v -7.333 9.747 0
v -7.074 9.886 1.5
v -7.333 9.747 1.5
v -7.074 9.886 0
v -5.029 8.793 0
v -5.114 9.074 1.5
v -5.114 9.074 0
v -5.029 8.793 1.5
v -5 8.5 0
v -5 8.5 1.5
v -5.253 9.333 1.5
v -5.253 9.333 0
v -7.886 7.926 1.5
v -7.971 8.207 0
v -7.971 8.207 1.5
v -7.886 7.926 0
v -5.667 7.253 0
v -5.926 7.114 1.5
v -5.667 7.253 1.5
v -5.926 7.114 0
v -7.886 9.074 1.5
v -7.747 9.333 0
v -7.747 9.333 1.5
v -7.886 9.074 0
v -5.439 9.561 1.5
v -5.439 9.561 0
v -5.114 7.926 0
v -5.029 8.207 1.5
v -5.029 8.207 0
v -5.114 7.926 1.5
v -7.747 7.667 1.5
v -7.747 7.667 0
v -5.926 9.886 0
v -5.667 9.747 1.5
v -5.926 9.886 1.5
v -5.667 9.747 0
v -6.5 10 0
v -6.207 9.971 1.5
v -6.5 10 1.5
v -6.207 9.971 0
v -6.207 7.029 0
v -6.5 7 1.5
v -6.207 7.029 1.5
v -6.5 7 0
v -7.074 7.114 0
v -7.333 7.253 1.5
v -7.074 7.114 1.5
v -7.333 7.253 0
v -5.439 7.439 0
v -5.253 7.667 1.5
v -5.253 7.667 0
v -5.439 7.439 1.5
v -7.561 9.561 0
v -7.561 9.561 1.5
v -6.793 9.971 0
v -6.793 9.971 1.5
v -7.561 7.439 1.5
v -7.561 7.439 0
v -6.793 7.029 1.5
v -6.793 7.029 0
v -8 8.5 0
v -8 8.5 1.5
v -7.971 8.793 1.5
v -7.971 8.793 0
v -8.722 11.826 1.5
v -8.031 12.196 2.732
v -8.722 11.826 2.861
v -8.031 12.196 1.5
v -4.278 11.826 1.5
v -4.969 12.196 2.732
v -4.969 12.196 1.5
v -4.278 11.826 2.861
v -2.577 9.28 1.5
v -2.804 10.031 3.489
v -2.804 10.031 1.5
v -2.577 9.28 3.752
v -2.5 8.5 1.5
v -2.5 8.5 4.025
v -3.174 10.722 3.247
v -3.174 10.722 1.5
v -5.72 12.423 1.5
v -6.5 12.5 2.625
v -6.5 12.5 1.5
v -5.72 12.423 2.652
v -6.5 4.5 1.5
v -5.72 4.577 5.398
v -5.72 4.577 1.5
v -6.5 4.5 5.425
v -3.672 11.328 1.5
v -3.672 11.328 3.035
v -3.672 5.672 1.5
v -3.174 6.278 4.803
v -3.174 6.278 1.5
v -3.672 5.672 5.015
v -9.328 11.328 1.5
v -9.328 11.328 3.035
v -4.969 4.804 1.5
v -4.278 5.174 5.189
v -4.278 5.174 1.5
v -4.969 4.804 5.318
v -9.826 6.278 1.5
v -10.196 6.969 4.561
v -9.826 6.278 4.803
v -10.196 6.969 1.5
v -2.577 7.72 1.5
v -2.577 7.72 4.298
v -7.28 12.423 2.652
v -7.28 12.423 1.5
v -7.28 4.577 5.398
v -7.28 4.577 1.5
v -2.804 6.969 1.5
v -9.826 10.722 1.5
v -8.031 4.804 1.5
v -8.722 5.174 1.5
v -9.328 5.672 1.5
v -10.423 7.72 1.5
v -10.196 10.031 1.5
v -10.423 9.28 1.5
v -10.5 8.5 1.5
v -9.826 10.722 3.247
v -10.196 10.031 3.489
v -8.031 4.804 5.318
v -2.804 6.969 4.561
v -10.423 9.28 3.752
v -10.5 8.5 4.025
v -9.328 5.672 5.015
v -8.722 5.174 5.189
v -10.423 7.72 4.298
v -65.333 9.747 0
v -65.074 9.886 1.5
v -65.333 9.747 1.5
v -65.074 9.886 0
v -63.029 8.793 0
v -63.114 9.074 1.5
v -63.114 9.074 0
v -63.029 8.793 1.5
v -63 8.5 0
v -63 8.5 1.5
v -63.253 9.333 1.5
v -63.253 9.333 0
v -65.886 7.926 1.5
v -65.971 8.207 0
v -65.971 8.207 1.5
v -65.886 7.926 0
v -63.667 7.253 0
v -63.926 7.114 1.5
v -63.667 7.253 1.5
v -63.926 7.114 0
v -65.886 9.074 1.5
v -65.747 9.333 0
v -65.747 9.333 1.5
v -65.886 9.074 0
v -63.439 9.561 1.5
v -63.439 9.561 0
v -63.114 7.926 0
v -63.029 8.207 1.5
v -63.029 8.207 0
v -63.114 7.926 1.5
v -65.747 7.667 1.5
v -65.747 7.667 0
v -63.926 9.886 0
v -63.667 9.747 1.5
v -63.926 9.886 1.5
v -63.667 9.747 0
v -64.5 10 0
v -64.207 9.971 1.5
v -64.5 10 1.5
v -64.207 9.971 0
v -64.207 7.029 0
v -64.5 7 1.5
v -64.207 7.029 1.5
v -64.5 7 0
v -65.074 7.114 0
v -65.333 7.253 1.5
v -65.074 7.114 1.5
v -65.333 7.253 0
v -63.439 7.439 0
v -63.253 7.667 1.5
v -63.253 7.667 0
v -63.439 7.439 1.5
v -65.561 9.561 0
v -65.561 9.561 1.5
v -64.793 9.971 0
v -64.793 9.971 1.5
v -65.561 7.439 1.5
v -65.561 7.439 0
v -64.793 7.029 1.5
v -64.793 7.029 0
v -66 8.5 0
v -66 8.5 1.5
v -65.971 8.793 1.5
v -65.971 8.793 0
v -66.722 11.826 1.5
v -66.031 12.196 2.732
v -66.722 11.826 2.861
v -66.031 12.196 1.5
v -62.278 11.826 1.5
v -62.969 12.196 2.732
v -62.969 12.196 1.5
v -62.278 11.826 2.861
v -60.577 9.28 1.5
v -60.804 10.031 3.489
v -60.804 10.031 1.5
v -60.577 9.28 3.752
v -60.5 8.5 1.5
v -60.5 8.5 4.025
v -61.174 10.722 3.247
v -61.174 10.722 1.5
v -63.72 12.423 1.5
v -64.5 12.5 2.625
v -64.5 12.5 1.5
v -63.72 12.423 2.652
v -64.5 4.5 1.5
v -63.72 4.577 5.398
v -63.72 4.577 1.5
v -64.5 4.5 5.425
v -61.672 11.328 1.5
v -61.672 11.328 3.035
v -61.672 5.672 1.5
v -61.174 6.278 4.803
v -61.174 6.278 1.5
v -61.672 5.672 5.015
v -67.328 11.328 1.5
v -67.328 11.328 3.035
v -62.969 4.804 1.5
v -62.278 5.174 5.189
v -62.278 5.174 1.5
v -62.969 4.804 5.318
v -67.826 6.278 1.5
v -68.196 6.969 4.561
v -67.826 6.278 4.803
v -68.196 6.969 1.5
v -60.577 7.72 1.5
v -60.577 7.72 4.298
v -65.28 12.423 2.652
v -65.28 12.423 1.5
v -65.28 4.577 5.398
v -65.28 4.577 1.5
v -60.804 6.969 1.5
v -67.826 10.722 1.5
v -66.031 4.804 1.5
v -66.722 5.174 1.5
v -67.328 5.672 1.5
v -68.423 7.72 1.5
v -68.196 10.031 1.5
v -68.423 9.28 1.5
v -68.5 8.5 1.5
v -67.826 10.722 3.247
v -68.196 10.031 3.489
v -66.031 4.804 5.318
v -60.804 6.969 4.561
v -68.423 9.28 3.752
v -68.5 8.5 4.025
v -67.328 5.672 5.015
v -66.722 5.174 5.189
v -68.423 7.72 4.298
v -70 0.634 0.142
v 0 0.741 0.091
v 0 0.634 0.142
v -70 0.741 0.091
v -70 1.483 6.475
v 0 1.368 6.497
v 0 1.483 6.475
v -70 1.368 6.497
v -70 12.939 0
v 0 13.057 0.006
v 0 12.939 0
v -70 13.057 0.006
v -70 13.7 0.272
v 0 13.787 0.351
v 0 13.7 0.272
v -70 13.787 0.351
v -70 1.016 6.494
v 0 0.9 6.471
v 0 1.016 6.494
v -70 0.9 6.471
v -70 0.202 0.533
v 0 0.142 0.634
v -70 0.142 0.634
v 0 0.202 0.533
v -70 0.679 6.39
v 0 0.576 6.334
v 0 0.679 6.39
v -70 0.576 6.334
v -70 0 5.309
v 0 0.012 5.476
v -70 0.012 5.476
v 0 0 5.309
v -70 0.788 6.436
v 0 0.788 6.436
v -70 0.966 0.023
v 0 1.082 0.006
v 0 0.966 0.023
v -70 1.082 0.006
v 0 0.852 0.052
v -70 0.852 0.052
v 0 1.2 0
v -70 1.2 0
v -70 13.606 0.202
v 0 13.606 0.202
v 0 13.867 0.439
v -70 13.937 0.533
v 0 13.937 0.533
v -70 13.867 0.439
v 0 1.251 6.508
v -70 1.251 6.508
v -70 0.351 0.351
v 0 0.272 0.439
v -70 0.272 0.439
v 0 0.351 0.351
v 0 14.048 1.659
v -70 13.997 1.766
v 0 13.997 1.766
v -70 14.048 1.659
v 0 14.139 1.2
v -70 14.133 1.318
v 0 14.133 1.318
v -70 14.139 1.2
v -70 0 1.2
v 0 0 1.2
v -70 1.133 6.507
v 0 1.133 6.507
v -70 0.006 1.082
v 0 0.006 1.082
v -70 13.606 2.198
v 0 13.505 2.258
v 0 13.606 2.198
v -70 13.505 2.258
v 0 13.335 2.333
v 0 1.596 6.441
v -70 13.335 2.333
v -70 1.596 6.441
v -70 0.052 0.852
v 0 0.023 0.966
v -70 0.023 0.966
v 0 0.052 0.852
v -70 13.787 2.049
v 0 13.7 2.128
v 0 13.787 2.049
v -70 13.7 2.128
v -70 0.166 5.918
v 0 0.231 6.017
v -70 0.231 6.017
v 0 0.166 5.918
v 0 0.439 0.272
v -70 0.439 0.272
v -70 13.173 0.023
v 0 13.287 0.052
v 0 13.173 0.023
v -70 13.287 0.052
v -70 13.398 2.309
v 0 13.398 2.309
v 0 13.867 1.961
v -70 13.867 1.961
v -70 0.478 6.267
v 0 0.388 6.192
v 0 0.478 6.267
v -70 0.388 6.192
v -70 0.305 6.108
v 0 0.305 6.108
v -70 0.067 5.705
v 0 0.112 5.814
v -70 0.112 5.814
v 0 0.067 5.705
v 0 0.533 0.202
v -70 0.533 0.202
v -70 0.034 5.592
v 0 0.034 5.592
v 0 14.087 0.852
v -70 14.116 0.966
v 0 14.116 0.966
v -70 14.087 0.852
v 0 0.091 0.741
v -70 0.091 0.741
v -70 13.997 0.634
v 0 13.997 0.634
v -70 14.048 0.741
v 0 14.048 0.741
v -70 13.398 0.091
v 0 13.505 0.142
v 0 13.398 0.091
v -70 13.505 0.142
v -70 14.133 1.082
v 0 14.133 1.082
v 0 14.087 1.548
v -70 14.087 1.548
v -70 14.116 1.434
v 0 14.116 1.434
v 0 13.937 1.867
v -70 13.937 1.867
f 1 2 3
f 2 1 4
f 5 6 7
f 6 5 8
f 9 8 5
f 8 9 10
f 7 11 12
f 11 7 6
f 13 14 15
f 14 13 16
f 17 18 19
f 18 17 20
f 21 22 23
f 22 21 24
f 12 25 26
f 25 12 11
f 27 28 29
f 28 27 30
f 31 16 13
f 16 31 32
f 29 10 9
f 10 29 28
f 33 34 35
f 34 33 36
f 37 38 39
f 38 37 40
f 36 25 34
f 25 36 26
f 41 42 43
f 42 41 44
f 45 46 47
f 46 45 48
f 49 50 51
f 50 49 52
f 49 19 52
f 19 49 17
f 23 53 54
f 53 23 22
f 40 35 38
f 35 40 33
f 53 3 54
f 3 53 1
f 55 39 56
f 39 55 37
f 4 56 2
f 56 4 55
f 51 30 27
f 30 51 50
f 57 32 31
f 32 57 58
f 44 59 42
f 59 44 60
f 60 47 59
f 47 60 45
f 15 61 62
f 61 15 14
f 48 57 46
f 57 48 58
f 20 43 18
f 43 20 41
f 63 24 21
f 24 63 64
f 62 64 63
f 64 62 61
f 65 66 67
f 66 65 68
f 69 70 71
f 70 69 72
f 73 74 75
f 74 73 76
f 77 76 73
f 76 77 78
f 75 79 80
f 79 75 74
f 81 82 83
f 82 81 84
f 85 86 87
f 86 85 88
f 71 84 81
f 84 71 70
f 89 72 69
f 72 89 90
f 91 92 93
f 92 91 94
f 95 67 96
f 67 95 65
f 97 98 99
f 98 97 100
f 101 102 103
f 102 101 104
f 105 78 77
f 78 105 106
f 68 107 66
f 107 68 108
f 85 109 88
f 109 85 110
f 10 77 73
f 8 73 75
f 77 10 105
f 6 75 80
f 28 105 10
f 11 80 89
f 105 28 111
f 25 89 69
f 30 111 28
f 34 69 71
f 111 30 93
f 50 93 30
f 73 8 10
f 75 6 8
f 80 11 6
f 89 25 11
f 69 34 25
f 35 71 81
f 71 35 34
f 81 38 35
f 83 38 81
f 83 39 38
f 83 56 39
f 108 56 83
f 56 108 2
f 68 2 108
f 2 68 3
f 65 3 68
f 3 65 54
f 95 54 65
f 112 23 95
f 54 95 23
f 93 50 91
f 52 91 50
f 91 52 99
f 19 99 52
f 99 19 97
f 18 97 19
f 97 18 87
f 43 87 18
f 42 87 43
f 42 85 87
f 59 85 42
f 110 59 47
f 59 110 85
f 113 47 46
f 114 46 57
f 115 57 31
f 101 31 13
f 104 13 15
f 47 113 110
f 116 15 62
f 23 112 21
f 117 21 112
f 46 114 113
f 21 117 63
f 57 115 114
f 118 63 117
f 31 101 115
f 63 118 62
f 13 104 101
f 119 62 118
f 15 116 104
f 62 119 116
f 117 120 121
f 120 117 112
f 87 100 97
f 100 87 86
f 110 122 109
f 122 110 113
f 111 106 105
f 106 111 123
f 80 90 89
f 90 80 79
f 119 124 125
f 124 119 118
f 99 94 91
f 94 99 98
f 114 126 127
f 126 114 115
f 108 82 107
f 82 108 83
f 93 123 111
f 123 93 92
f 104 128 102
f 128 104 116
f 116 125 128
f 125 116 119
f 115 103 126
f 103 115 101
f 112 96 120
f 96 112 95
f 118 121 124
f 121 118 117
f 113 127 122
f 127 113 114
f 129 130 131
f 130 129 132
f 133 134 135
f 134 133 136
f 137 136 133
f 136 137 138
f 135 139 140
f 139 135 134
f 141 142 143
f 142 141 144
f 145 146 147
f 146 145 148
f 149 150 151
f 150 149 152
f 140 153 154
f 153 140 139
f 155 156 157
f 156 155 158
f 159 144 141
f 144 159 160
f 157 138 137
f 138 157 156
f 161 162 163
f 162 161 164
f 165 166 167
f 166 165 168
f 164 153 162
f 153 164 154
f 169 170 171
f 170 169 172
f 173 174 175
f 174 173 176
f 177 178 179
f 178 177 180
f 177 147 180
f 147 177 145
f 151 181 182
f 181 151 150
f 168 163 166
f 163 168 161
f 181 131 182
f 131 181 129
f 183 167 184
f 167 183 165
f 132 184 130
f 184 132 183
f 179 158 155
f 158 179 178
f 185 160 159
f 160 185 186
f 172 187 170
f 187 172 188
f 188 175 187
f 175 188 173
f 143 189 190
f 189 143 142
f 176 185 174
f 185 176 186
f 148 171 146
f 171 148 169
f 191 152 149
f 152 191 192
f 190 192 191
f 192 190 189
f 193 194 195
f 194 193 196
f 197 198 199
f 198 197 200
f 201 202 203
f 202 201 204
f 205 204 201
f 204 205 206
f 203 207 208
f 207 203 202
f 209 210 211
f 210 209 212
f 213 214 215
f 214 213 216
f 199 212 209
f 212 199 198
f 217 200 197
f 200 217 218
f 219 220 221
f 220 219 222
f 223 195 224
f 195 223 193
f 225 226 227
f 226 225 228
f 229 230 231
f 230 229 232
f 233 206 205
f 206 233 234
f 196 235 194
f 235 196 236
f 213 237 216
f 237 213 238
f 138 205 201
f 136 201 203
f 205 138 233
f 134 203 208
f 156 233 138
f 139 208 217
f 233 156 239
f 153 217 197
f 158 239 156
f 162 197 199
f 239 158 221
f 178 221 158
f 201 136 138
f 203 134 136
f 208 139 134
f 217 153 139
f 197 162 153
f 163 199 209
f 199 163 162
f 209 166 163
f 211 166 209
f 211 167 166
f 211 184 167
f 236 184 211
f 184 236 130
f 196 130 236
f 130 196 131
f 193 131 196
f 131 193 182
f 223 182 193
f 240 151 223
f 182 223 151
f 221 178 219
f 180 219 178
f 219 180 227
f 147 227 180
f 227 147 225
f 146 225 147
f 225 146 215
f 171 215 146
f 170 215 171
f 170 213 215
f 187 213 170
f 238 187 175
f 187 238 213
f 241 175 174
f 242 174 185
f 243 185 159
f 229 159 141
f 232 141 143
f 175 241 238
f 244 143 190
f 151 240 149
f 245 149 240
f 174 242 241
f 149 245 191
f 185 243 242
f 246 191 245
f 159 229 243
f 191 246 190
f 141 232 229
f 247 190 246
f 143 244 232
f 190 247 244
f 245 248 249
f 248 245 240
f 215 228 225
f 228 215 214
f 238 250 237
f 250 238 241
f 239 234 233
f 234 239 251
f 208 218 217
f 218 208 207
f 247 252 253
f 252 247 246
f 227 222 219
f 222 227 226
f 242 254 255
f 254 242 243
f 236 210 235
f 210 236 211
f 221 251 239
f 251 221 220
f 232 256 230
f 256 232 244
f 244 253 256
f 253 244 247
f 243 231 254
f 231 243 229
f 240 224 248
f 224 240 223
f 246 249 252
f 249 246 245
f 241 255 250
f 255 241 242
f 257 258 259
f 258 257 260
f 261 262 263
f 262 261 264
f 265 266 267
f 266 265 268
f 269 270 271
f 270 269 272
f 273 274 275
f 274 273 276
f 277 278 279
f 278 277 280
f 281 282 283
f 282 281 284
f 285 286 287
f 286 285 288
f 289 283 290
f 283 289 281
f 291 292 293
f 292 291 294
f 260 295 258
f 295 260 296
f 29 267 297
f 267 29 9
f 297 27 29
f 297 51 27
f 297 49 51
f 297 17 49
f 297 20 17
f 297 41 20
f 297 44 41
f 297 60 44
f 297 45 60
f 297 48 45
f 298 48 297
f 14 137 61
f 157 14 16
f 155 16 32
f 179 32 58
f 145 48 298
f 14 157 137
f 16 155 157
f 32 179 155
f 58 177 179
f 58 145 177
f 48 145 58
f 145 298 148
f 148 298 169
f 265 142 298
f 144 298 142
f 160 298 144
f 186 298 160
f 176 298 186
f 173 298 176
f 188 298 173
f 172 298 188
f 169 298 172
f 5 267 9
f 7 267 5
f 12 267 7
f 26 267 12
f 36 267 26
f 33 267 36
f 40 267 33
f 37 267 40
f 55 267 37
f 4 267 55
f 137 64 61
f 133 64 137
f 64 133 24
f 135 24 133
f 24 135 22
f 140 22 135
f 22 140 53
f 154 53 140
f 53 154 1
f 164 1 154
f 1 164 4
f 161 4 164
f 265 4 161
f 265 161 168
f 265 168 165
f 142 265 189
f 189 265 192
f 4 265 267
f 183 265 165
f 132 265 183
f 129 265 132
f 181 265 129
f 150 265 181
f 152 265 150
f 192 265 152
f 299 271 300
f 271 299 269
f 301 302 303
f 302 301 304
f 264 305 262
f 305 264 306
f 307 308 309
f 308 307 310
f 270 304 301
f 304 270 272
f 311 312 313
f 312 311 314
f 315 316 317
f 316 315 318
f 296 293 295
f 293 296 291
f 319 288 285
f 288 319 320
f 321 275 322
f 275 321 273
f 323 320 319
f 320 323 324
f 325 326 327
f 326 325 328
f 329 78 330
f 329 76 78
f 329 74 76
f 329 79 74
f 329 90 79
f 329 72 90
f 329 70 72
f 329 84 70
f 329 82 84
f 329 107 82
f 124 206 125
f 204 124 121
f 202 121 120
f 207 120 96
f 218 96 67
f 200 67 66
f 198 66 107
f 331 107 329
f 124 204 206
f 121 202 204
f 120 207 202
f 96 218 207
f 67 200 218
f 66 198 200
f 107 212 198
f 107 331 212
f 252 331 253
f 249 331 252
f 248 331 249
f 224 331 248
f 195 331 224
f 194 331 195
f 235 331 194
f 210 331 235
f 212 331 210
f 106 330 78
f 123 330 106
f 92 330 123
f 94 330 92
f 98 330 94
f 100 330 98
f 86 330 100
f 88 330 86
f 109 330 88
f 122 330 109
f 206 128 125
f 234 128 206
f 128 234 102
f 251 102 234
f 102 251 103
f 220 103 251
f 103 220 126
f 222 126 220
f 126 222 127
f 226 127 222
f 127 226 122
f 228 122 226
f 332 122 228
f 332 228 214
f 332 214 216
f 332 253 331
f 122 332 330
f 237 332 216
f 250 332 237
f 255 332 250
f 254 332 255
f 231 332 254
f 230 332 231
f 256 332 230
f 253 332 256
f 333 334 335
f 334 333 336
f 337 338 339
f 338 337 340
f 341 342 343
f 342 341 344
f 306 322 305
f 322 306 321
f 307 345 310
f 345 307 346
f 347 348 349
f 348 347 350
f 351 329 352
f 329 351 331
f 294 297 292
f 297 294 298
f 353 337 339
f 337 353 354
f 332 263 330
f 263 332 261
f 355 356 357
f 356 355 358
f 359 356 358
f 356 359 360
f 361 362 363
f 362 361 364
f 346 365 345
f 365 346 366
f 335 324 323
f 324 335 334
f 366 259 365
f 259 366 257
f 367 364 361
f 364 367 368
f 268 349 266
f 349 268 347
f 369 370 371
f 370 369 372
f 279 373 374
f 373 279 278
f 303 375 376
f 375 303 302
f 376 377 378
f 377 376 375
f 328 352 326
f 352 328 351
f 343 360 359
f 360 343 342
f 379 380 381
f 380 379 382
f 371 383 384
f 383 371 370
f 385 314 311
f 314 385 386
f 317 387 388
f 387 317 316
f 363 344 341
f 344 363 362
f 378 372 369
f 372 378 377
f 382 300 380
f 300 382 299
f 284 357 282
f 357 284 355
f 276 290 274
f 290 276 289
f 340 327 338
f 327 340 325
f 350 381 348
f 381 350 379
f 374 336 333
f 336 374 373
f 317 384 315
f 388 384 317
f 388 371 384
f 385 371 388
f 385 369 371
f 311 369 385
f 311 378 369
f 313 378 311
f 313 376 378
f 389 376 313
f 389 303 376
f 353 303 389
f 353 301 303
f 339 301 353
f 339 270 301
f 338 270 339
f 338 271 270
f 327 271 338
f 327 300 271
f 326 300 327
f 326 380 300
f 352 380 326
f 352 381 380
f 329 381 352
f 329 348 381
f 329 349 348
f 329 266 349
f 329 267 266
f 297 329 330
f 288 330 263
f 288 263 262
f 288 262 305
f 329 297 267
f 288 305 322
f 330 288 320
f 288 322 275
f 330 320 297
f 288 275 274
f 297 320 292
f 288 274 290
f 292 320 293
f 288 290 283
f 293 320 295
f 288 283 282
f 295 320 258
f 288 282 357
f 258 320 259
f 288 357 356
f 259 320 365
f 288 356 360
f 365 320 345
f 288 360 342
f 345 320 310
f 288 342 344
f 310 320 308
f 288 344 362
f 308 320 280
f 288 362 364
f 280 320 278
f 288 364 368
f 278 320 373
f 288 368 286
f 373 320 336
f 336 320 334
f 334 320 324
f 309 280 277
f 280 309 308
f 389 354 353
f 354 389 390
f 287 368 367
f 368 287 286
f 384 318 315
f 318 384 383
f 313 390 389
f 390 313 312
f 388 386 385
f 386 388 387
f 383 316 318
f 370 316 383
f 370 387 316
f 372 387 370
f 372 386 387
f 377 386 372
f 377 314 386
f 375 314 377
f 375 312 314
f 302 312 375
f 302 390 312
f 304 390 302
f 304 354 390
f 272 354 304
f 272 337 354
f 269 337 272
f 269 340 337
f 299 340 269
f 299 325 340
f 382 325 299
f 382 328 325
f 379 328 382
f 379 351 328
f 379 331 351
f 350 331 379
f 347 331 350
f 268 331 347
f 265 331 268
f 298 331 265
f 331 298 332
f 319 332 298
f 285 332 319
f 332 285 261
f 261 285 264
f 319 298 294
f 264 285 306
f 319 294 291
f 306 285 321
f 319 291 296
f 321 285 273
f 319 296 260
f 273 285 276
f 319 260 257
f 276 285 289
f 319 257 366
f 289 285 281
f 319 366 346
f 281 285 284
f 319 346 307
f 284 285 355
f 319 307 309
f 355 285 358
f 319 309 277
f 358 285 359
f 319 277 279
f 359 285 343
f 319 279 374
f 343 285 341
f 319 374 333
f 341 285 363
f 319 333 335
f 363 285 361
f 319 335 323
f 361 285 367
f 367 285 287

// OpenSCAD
// file: parts/screw_cutout.scad
/*
 * Nomad Core - Screw Cutout Module
 * M2.5 screw hole with hex nut recess access from bottom
 * 
 * Screw specs: M2.5 threading, 16mm long, TR8 hex head
 */

// ============================================
// SCREW CUTOUT CONFIGURATION
// ============================================
// All screw cutout settings:
// - Shaft diameter and height
// - Nut recess dimensions and positioning

// ============================================
// SCREW SPECIFICATIONS
// ============================================
screw_shaft_diameter = 3.0;   // Clearance for M2.5 screw (mm)
screw_shaft_height = 25.0;    // Full height to pass through (mm)
nut_recess_diameter = 8.0;    // Hex nut pocket diameter (mm)
nut_recess_height = 6.0;      // Hex nut pocket depth (mm)
nut_recess_offset = 4.5;      // Start position from bottom (mm)

// ============================================
// RENDER QUALITY
// ============================================
$fn = 32;

// ============================================
// SCREW CUTOUT MODULE
// ============================================
// Creates M2.5 screw hole with hex nut recess accessible from bottom
//
// Parameters: None (uses global specifications above)
//
// Usage: difference() { your_part(); translate([x,y,z]) screw_cutout(); }

module screw_cutout() {
    union() {
        // Screw shaft hole - full height to allow screw to pass through
        cylinder(h=screw_shaft_height, d=screw_shaft_diameter, center=false);
        
        // Hex nut recess - starts offset from bottom to create nut pocket
        translate([0, 0, nut_recess_offset])
            cylinder(h=nut_recess_height, d=nut_recess_diameter, center=false);
    }
}

// ============================================
// TEST RENDER (uncomment for visualization)
// ============================================
// screw_cutout();
//
// // Show reference cube to see the cutout in context
// %translate([0, 0, 5])
//     cube([15, 15, 5], center=true);
// main file
/*
 * Nomad Core - Module Mount Bracket
 * Mounting bracket for compute module (Raspberry Pi or compatible)
 * 
 * Single wedge-shaped bracket with M2.5 screw holes for secure mounting
 * Designed to attach to left side of main baseplate
 */

// ============================================
// IMPORTS
// ============================================
use <parts/screw_cutout.scad>

// ============================================
// MODULE MOUNT CONFIGURATION
// ============================================
// All module mount settings consolidated here for easy adjustment:
// - Wedge dimensions
// - Screw hole positions (matching Pi 3B+ pattern)
// - Component positioning

// ============================================
// WEDGE 1 DIMENSIONS (Long wedge with screw holes)
// ============================================
wedge1_size = [20.0, 70.0, 7.0];  // [Width, Length, Height] (mm)
nose_round_radius = 1.2;          // Radius to soften wedge nose/corners (mm)

// ============================================
// SCREW HOLE POSITIONS
// ============================================
// Hole positions on Wedge 1 match Pi 3B+ mounting pattern
hole1_offset = [6.5, 8.5];   // [Long edge, Short edge] distance (mm)
pi_length_spacing = 58.0;    // Standard Pi mounting spacing (mm)
hole2_offset = [hole1_offset[0] + pi_length_spacing, hole1_offset[1]];  // [64.5, 8.5] (mm)
screw_depth = -3.0;          // Inset from wedge surface (mm)

// ============================================
// RENDER QUALITY
// ============================================
$fn = 64;

// ============================================
// RIGHT ANGLE WEDGE MODULE
// ============================================
// Creates a right-angle triangular prism
//
// Parameters:
// - width: Triangle-to-triangle dimension (mm)
// - length: Back wall to nose dimension (mm)
// - height: Tall dimension (mm)

module wedge(width, length, height) {
    // Rotate to proper orientation for mounting
    rotate([0, 0, 90])
    rotate([90, 0, 0])
    translate([0, 0, -length])
    linear_extrude(height=length)
        offset(r=nose_round_radius)
        offset(delta=-nose_round_radius)
            polygon([
                [0, 0],        // Origin
                [width, 0],    // Right edge
                [0, height]    // Top corner
            ]);
}

// ============================================
// WEDGE 1 WITH SCREW HOLES
// ============================================
// Long wedge with two M2.5 screw holes matching Pi mounting pattern

module wedge1_with_holes() {
    difference() {
        // Main wedge body
        wedge(wedge1_size[0], wedge1_size[1], wedge1_size[2]);
        
        // First screw hole
        translate([-hole1_offset[0], hole1_offset[1], screw_depth])
            screw_cutout();
        
        // Second screw hole (Pi lengthwise spacing)
        translate([-hole2_offset[0], hole2_offset[1], screw_depth])
            screw_cutout();
    }
}

// ============================================
// COMPLETE MODULE MOUNT ASSEMBLY
// ============================================
module module_mount() {
    union() {
        // Wedge 1 (long wedge with screw holes)
        wedge1_with_holes();
    }
}

// ============================================
// MAIN RENDER
// ============================================
module_mount();
